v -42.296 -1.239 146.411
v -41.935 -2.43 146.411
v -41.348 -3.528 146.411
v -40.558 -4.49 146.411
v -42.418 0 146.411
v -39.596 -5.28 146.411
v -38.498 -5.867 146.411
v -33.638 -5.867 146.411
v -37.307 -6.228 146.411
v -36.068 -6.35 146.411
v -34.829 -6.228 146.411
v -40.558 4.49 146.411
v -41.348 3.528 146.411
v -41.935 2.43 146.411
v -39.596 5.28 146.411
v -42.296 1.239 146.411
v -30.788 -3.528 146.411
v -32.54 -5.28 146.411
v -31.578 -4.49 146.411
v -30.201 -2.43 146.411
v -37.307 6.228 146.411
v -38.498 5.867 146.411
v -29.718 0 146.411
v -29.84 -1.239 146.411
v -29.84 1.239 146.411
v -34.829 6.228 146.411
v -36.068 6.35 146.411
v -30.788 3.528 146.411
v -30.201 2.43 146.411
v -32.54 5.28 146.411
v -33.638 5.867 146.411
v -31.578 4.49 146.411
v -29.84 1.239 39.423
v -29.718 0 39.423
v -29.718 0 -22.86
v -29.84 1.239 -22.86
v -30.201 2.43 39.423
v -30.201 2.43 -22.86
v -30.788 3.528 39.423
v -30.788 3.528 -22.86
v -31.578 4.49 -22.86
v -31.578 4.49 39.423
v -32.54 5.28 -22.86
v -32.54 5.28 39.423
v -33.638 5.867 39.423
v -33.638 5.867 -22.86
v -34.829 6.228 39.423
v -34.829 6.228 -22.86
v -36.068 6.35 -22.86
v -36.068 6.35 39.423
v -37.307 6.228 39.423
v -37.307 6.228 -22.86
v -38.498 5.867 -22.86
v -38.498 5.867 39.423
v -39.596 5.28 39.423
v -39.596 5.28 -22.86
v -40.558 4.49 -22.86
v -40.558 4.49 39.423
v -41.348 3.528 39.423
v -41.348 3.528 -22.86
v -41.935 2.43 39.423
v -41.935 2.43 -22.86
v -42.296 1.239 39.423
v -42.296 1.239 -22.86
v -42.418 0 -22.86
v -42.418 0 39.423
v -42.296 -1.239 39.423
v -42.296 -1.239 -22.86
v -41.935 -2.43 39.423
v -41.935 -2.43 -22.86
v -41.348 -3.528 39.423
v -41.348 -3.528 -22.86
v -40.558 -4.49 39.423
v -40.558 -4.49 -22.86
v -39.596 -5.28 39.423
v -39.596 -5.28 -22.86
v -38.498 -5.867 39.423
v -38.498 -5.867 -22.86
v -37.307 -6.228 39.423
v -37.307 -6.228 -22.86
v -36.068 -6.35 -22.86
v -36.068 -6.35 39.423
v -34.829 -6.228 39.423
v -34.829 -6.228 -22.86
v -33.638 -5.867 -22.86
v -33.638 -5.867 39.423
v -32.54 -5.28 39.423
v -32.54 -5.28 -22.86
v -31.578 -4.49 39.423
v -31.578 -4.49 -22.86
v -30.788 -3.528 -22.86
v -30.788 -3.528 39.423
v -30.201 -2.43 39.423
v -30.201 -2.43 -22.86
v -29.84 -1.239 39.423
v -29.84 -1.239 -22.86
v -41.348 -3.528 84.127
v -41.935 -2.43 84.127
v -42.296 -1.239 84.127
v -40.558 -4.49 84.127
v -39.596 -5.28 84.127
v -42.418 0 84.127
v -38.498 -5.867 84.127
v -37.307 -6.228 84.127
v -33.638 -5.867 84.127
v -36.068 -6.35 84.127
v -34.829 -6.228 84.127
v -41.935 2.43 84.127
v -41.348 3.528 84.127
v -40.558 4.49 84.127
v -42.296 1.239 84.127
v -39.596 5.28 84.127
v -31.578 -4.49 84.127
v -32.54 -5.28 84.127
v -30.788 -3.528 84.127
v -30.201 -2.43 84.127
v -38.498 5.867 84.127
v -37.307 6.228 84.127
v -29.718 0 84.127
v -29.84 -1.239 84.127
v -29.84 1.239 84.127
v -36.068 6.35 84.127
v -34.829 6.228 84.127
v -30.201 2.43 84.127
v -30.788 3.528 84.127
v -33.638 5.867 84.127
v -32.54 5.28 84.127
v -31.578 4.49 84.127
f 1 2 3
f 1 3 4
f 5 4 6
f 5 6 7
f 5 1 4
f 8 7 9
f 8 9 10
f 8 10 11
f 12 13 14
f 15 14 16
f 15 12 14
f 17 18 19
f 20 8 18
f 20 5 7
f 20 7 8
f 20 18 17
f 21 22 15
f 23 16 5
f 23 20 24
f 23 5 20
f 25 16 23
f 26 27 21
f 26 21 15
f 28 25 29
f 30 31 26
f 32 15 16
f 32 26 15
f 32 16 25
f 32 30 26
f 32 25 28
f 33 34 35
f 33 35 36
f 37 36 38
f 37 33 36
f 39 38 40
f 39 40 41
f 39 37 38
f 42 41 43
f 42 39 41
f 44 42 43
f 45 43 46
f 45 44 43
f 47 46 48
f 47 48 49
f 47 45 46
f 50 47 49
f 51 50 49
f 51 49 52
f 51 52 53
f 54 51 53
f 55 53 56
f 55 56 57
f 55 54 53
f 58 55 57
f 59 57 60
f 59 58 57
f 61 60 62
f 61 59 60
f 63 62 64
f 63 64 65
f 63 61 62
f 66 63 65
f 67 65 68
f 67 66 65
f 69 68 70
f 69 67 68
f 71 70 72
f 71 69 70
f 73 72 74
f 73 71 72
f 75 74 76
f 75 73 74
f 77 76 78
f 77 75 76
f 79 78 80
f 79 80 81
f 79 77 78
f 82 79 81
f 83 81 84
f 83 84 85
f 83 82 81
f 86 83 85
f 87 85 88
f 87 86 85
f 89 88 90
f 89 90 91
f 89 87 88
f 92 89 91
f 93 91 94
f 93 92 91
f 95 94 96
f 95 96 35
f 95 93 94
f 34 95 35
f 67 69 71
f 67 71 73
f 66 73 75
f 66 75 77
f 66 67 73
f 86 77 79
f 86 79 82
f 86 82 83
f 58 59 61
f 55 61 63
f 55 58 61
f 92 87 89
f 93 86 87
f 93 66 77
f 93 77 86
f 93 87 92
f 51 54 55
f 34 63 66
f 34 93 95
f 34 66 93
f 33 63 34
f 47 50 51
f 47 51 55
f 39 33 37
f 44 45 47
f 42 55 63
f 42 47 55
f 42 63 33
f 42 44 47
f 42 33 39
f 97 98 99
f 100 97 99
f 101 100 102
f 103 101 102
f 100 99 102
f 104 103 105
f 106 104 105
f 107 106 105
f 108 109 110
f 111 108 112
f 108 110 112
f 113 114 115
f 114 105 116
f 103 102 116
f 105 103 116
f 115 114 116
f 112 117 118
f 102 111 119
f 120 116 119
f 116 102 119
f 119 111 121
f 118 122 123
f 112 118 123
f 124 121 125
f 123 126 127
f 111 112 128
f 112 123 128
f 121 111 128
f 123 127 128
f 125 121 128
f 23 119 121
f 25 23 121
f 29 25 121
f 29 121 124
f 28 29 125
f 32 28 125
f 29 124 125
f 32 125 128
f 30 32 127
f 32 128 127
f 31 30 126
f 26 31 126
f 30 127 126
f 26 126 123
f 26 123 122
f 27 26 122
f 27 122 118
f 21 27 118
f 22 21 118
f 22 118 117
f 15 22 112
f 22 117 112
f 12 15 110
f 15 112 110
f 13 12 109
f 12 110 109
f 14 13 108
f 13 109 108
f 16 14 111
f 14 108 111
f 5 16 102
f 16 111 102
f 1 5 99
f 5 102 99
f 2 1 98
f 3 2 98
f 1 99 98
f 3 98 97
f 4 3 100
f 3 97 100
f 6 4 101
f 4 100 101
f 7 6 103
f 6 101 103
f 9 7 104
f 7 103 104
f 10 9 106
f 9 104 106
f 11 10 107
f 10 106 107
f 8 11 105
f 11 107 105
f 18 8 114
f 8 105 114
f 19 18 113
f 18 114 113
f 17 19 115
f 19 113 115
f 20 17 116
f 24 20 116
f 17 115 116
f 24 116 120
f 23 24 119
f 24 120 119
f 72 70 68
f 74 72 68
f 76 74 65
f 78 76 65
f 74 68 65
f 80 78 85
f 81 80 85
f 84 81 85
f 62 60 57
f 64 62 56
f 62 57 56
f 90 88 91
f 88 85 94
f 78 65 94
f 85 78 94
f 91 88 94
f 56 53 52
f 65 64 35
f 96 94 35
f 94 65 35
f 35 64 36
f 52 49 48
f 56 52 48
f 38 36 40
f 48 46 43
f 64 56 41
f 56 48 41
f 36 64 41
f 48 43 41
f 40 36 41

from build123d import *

# Parameters (mm, degrees)
BOSS_EXTRUDE1_START     = -62.28334
BOSS_EXTRUDE1_OUTLINE_R = 6.35
BOSS_EXTRUDE1_DEPTH     = 62.28334
SKETCH3_R               = 6.35
BOSS_EXTRUDE2_DEPTH     = 62.28334


# Read off the part's stored shape, not the designer's step: Boss-Extrude1
with BuildPart() as part:
    # Boss-Extrude1 outline → Boss-Extrude1 (new body)
    with BuildSketch(Plane.XY.offset(146.41068).offset(BOSS_EXTRUDE1_START)):
        with Locations((-36.068, 0)):
            Circle(BOSS_EXTRUDE1_OUTLINE_R)
    extrude(amount=BOSS_EXTRUDE1_DEPTH)


with BuildPart() as body_2:
    # Sketch3 → Boss-Extrude2 (new body)
    with BuildSketch(Plane.XY.offset(39.42334)):
        with Locations((-36.068, 0)):
            Circle(SKETCH3_R)
    extrude(amount=-BOSS_EXTRUDE2_DEPTH)


solid = Compound([part.part, body_2.part])
